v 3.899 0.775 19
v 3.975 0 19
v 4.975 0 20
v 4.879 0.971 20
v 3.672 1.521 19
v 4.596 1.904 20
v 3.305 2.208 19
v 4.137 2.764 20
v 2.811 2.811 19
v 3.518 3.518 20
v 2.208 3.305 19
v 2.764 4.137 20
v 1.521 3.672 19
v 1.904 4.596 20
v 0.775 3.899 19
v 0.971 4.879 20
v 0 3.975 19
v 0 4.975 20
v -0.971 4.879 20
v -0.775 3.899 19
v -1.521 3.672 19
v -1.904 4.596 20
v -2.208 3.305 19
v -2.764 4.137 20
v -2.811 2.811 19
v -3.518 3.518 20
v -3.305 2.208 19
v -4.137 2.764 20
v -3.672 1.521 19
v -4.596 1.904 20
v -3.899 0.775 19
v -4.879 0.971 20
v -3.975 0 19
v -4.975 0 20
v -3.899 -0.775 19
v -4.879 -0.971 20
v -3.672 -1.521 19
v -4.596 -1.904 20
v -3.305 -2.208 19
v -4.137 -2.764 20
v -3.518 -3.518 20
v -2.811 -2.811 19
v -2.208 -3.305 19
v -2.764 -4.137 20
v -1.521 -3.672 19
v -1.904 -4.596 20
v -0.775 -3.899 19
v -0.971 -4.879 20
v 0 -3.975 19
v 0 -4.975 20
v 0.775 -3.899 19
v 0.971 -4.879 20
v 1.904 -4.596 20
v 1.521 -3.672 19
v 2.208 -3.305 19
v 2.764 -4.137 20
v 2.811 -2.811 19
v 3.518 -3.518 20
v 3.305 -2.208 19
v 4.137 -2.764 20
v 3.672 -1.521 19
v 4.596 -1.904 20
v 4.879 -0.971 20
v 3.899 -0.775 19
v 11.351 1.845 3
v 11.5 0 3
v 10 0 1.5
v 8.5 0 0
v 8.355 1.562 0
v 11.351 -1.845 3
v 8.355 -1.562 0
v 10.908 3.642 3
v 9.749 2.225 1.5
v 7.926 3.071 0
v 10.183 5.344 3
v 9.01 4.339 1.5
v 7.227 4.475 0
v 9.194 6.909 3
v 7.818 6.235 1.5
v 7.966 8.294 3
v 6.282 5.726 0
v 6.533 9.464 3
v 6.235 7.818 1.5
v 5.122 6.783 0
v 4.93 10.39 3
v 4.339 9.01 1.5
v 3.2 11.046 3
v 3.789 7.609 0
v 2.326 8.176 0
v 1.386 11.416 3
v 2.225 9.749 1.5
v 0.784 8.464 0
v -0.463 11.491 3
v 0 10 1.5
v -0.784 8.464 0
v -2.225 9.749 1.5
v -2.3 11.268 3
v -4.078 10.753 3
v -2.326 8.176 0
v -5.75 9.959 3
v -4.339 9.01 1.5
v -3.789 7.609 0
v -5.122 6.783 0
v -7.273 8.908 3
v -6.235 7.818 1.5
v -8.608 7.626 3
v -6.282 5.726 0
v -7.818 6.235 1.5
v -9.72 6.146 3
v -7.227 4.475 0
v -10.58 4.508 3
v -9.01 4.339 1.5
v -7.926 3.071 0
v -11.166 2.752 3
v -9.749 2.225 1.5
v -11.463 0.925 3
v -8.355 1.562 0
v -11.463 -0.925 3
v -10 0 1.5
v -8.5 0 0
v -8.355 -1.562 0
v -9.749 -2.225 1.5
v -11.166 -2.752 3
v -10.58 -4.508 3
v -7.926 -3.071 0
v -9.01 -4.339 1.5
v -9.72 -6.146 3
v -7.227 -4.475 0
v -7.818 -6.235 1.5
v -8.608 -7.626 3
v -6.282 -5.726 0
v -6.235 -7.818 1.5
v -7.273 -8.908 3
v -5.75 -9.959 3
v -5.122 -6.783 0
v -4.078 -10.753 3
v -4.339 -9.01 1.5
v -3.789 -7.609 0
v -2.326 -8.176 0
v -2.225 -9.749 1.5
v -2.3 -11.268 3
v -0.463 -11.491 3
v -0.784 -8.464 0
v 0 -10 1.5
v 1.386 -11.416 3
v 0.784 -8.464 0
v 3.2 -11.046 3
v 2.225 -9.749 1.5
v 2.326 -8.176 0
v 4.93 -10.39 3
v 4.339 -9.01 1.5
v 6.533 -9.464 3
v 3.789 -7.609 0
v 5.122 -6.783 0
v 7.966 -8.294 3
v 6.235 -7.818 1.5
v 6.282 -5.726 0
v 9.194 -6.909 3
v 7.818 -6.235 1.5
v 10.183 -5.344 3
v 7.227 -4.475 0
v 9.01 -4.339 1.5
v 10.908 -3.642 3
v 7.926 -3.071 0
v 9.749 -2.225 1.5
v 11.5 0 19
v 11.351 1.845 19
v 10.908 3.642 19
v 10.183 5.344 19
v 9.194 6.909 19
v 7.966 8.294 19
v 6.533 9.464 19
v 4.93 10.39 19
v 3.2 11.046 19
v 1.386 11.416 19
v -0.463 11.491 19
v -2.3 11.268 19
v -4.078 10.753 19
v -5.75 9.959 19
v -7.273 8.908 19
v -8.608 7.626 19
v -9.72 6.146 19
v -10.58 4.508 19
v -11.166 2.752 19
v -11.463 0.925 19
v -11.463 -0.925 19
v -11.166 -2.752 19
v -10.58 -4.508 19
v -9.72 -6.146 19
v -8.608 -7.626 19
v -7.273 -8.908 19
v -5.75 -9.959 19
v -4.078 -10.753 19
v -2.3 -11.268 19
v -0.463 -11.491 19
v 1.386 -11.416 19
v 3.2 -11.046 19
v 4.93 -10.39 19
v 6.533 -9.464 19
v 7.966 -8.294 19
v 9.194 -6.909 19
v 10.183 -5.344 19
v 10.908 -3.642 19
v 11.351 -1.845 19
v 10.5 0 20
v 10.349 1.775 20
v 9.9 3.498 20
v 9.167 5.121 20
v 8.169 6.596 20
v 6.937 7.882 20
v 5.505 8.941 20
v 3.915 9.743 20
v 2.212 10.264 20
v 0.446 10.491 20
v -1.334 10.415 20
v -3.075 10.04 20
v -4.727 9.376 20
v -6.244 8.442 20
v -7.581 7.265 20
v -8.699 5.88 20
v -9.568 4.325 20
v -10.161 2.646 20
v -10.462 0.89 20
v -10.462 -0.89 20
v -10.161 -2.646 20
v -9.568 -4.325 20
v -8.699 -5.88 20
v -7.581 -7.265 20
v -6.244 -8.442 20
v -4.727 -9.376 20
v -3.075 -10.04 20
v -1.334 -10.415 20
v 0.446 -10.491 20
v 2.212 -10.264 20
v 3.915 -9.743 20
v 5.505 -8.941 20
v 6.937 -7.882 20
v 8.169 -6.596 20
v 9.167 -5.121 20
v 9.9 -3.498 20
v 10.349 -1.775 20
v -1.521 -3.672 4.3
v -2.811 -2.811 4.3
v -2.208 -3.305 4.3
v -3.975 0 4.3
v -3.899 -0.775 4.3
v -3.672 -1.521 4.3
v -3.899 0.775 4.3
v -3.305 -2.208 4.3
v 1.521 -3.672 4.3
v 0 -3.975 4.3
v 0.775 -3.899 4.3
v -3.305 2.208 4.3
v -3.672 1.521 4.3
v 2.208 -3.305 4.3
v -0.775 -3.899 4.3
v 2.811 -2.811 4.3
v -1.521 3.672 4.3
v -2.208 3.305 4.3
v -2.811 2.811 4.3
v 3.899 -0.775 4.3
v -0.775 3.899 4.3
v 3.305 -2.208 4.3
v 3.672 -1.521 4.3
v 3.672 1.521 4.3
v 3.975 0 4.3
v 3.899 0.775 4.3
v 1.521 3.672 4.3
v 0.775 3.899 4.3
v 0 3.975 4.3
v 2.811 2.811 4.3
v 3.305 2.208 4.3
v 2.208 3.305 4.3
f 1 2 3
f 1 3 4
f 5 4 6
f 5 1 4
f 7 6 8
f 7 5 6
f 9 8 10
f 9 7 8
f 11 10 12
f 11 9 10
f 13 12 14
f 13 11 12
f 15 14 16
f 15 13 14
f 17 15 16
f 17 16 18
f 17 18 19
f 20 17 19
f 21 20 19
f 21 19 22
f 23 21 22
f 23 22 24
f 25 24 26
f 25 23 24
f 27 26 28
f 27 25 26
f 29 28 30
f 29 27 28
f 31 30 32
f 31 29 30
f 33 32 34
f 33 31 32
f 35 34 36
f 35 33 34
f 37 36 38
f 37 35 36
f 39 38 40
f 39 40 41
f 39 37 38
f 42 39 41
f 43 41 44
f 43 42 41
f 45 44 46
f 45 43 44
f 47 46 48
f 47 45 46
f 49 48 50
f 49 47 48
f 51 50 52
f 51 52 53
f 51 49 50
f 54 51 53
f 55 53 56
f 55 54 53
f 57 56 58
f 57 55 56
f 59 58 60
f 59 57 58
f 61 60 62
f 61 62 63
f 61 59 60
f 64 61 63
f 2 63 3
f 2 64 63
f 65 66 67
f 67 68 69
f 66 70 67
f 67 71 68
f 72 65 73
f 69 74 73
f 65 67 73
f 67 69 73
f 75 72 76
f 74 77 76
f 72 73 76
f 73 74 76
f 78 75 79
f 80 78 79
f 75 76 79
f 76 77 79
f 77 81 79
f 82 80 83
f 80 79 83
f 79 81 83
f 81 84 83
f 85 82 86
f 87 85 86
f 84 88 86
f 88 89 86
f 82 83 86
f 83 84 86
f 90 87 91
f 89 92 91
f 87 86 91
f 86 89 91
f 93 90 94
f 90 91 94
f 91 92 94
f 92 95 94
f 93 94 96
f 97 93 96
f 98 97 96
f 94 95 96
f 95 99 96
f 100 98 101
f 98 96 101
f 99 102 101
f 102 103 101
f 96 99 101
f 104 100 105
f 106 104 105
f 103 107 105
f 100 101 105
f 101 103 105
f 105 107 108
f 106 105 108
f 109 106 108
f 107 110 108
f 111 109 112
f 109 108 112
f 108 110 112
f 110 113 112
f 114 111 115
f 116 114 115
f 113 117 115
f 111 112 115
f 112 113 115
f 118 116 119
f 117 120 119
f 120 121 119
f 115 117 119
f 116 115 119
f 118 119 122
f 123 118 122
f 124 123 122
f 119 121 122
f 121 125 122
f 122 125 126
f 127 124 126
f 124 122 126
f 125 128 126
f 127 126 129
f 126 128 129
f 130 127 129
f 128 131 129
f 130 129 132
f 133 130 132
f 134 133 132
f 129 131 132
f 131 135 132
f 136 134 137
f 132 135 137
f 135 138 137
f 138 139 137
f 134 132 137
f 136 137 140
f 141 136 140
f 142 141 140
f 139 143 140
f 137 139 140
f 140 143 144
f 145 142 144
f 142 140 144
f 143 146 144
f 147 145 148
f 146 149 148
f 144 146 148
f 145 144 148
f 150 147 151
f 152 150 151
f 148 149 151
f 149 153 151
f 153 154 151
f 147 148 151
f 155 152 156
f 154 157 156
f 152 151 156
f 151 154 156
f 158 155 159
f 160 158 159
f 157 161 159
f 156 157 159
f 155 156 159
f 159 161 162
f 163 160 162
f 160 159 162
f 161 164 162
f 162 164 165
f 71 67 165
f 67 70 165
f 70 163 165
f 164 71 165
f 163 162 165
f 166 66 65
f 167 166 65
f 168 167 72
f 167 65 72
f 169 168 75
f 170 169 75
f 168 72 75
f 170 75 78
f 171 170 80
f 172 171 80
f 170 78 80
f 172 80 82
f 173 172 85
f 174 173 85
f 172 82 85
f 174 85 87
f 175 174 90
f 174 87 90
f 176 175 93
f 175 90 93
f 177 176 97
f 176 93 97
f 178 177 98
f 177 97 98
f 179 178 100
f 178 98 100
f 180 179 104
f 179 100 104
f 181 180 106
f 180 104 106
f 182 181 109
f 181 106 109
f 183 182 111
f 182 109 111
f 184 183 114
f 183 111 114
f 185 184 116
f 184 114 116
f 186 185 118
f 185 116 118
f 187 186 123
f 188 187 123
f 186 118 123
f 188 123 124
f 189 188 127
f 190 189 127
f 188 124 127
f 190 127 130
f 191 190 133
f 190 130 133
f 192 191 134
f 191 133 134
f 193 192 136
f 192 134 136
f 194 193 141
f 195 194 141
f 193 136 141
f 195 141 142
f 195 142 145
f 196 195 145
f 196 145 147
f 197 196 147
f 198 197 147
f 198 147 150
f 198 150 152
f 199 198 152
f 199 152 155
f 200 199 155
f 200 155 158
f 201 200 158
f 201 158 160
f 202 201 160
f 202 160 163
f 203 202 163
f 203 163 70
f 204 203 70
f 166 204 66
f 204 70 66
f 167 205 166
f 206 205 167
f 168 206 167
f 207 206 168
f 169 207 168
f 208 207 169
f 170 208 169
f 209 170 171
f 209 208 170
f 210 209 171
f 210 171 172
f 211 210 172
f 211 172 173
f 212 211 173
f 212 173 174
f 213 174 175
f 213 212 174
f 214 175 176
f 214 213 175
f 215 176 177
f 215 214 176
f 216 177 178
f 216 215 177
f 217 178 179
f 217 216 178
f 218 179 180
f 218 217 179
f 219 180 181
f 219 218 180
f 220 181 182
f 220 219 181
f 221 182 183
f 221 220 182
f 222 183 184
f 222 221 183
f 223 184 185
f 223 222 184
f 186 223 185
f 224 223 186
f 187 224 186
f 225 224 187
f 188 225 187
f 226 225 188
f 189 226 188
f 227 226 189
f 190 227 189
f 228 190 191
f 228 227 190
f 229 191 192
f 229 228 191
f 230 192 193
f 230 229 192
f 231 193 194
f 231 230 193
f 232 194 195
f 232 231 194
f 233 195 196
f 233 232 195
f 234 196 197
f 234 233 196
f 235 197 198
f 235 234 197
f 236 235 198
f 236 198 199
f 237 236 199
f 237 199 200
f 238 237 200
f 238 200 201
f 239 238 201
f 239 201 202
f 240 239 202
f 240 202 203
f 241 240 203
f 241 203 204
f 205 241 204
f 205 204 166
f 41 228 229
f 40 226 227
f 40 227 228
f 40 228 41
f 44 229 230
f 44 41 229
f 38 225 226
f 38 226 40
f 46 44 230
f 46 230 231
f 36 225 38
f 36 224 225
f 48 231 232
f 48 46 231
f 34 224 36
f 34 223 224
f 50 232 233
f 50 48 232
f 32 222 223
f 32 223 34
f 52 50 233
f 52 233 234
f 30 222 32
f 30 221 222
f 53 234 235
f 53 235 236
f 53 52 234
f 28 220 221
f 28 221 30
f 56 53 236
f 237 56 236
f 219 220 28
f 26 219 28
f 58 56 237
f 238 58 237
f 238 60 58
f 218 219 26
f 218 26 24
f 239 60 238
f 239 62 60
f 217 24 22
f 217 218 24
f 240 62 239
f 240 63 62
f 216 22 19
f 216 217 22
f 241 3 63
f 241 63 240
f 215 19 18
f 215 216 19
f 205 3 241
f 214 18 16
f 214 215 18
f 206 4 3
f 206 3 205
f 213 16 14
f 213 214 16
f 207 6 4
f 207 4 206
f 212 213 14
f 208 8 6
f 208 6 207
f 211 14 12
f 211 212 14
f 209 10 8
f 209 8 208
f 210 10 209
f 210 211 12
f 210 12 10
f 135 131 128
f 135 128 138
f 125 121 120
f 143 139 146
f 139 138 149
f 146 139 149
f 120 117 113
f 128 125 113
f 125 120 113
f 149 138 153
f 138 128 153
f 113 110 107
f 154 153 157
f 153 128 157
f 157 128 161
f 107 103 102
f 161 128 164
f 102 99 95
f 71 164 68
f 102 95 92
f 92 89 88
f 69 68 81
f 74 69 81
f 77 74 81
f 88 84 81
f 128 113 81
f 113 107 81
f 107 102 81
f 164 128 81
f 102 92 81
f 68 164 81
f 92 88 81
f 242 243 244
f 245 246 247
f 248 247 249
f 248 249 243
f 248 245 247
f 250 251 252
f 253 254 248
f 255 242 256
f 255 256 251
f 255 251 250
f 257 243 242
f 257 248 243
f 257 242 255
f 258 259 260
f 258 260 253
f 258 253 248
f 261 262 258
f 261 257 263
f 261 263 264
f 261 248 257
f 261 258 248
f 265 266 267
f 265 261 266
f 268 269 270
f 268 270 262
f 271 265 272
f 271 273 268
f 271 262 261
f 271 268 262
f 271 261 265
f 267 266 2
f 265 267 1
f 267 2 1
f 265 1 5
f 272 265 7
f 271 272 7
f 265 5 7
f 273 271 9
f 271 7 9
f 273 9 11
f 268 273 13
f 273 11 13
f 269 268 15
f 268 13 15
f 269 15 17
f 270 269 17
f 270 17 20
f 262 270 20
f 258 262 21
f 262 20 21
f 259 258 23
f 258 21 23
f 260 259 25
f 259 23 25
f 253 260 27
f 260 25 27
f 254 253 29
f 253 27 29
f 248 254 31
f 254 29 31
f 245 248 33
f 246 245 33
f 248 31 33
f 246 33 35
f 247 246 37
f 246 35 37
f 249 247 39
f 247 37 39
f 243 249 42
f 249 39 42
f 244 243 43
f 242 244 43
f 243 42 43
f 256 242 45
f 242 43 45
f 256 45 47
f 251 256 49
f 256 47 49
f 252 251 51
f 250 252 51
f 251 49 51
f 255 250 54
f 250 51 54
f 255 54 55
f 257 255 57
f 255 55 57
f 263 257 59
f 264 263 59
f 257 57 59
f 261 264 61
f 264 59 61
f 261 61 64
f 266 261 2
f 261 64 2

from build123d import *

# Parameters (mm, degrees)
F0_R     = 11.5
F0_R_2   = 3.985
F1_DEPTH = 20
F2_R     = 3.975
F3_DEPTH = 15.7
F4_SIZE  = 3
F5_SIZE  = 1


with BuildPart() as f1:
    # F0 (on Top) → F1 (new body)
    with BuildSketch(Plane.XY):
        Circle(F0_R)
        Circle(F0_R_2, mode=Mode.SUBTRACT)
        Circle(F0_R_2)
    extrude(amount=F1_DEPTH)

    # F2 (on face) → F3 (cut)
    with BuildSketch(Plane.XY.offset(20)):
        Circle(F2_R)
    extrude(amount=-F3_DEPTH, mode=Mode.SUBTRACT)

    # F4
    f4_edges = [f1.edges().sort_by_distance(p)[0] for p in [
        (-11.5, 0, 0),
    ]]
    chamfer(f4_edges, length=F4_SIZE)

    # F5
    f5_edges = [f1.edges().sort_by_distance(p)[0] for p in [
        (-11.5, 0, 20),
        (-3.975, 0, 20),
    ]]
    chamfer(f5_edges, length=F5_SIZE)


solid = f1.part
